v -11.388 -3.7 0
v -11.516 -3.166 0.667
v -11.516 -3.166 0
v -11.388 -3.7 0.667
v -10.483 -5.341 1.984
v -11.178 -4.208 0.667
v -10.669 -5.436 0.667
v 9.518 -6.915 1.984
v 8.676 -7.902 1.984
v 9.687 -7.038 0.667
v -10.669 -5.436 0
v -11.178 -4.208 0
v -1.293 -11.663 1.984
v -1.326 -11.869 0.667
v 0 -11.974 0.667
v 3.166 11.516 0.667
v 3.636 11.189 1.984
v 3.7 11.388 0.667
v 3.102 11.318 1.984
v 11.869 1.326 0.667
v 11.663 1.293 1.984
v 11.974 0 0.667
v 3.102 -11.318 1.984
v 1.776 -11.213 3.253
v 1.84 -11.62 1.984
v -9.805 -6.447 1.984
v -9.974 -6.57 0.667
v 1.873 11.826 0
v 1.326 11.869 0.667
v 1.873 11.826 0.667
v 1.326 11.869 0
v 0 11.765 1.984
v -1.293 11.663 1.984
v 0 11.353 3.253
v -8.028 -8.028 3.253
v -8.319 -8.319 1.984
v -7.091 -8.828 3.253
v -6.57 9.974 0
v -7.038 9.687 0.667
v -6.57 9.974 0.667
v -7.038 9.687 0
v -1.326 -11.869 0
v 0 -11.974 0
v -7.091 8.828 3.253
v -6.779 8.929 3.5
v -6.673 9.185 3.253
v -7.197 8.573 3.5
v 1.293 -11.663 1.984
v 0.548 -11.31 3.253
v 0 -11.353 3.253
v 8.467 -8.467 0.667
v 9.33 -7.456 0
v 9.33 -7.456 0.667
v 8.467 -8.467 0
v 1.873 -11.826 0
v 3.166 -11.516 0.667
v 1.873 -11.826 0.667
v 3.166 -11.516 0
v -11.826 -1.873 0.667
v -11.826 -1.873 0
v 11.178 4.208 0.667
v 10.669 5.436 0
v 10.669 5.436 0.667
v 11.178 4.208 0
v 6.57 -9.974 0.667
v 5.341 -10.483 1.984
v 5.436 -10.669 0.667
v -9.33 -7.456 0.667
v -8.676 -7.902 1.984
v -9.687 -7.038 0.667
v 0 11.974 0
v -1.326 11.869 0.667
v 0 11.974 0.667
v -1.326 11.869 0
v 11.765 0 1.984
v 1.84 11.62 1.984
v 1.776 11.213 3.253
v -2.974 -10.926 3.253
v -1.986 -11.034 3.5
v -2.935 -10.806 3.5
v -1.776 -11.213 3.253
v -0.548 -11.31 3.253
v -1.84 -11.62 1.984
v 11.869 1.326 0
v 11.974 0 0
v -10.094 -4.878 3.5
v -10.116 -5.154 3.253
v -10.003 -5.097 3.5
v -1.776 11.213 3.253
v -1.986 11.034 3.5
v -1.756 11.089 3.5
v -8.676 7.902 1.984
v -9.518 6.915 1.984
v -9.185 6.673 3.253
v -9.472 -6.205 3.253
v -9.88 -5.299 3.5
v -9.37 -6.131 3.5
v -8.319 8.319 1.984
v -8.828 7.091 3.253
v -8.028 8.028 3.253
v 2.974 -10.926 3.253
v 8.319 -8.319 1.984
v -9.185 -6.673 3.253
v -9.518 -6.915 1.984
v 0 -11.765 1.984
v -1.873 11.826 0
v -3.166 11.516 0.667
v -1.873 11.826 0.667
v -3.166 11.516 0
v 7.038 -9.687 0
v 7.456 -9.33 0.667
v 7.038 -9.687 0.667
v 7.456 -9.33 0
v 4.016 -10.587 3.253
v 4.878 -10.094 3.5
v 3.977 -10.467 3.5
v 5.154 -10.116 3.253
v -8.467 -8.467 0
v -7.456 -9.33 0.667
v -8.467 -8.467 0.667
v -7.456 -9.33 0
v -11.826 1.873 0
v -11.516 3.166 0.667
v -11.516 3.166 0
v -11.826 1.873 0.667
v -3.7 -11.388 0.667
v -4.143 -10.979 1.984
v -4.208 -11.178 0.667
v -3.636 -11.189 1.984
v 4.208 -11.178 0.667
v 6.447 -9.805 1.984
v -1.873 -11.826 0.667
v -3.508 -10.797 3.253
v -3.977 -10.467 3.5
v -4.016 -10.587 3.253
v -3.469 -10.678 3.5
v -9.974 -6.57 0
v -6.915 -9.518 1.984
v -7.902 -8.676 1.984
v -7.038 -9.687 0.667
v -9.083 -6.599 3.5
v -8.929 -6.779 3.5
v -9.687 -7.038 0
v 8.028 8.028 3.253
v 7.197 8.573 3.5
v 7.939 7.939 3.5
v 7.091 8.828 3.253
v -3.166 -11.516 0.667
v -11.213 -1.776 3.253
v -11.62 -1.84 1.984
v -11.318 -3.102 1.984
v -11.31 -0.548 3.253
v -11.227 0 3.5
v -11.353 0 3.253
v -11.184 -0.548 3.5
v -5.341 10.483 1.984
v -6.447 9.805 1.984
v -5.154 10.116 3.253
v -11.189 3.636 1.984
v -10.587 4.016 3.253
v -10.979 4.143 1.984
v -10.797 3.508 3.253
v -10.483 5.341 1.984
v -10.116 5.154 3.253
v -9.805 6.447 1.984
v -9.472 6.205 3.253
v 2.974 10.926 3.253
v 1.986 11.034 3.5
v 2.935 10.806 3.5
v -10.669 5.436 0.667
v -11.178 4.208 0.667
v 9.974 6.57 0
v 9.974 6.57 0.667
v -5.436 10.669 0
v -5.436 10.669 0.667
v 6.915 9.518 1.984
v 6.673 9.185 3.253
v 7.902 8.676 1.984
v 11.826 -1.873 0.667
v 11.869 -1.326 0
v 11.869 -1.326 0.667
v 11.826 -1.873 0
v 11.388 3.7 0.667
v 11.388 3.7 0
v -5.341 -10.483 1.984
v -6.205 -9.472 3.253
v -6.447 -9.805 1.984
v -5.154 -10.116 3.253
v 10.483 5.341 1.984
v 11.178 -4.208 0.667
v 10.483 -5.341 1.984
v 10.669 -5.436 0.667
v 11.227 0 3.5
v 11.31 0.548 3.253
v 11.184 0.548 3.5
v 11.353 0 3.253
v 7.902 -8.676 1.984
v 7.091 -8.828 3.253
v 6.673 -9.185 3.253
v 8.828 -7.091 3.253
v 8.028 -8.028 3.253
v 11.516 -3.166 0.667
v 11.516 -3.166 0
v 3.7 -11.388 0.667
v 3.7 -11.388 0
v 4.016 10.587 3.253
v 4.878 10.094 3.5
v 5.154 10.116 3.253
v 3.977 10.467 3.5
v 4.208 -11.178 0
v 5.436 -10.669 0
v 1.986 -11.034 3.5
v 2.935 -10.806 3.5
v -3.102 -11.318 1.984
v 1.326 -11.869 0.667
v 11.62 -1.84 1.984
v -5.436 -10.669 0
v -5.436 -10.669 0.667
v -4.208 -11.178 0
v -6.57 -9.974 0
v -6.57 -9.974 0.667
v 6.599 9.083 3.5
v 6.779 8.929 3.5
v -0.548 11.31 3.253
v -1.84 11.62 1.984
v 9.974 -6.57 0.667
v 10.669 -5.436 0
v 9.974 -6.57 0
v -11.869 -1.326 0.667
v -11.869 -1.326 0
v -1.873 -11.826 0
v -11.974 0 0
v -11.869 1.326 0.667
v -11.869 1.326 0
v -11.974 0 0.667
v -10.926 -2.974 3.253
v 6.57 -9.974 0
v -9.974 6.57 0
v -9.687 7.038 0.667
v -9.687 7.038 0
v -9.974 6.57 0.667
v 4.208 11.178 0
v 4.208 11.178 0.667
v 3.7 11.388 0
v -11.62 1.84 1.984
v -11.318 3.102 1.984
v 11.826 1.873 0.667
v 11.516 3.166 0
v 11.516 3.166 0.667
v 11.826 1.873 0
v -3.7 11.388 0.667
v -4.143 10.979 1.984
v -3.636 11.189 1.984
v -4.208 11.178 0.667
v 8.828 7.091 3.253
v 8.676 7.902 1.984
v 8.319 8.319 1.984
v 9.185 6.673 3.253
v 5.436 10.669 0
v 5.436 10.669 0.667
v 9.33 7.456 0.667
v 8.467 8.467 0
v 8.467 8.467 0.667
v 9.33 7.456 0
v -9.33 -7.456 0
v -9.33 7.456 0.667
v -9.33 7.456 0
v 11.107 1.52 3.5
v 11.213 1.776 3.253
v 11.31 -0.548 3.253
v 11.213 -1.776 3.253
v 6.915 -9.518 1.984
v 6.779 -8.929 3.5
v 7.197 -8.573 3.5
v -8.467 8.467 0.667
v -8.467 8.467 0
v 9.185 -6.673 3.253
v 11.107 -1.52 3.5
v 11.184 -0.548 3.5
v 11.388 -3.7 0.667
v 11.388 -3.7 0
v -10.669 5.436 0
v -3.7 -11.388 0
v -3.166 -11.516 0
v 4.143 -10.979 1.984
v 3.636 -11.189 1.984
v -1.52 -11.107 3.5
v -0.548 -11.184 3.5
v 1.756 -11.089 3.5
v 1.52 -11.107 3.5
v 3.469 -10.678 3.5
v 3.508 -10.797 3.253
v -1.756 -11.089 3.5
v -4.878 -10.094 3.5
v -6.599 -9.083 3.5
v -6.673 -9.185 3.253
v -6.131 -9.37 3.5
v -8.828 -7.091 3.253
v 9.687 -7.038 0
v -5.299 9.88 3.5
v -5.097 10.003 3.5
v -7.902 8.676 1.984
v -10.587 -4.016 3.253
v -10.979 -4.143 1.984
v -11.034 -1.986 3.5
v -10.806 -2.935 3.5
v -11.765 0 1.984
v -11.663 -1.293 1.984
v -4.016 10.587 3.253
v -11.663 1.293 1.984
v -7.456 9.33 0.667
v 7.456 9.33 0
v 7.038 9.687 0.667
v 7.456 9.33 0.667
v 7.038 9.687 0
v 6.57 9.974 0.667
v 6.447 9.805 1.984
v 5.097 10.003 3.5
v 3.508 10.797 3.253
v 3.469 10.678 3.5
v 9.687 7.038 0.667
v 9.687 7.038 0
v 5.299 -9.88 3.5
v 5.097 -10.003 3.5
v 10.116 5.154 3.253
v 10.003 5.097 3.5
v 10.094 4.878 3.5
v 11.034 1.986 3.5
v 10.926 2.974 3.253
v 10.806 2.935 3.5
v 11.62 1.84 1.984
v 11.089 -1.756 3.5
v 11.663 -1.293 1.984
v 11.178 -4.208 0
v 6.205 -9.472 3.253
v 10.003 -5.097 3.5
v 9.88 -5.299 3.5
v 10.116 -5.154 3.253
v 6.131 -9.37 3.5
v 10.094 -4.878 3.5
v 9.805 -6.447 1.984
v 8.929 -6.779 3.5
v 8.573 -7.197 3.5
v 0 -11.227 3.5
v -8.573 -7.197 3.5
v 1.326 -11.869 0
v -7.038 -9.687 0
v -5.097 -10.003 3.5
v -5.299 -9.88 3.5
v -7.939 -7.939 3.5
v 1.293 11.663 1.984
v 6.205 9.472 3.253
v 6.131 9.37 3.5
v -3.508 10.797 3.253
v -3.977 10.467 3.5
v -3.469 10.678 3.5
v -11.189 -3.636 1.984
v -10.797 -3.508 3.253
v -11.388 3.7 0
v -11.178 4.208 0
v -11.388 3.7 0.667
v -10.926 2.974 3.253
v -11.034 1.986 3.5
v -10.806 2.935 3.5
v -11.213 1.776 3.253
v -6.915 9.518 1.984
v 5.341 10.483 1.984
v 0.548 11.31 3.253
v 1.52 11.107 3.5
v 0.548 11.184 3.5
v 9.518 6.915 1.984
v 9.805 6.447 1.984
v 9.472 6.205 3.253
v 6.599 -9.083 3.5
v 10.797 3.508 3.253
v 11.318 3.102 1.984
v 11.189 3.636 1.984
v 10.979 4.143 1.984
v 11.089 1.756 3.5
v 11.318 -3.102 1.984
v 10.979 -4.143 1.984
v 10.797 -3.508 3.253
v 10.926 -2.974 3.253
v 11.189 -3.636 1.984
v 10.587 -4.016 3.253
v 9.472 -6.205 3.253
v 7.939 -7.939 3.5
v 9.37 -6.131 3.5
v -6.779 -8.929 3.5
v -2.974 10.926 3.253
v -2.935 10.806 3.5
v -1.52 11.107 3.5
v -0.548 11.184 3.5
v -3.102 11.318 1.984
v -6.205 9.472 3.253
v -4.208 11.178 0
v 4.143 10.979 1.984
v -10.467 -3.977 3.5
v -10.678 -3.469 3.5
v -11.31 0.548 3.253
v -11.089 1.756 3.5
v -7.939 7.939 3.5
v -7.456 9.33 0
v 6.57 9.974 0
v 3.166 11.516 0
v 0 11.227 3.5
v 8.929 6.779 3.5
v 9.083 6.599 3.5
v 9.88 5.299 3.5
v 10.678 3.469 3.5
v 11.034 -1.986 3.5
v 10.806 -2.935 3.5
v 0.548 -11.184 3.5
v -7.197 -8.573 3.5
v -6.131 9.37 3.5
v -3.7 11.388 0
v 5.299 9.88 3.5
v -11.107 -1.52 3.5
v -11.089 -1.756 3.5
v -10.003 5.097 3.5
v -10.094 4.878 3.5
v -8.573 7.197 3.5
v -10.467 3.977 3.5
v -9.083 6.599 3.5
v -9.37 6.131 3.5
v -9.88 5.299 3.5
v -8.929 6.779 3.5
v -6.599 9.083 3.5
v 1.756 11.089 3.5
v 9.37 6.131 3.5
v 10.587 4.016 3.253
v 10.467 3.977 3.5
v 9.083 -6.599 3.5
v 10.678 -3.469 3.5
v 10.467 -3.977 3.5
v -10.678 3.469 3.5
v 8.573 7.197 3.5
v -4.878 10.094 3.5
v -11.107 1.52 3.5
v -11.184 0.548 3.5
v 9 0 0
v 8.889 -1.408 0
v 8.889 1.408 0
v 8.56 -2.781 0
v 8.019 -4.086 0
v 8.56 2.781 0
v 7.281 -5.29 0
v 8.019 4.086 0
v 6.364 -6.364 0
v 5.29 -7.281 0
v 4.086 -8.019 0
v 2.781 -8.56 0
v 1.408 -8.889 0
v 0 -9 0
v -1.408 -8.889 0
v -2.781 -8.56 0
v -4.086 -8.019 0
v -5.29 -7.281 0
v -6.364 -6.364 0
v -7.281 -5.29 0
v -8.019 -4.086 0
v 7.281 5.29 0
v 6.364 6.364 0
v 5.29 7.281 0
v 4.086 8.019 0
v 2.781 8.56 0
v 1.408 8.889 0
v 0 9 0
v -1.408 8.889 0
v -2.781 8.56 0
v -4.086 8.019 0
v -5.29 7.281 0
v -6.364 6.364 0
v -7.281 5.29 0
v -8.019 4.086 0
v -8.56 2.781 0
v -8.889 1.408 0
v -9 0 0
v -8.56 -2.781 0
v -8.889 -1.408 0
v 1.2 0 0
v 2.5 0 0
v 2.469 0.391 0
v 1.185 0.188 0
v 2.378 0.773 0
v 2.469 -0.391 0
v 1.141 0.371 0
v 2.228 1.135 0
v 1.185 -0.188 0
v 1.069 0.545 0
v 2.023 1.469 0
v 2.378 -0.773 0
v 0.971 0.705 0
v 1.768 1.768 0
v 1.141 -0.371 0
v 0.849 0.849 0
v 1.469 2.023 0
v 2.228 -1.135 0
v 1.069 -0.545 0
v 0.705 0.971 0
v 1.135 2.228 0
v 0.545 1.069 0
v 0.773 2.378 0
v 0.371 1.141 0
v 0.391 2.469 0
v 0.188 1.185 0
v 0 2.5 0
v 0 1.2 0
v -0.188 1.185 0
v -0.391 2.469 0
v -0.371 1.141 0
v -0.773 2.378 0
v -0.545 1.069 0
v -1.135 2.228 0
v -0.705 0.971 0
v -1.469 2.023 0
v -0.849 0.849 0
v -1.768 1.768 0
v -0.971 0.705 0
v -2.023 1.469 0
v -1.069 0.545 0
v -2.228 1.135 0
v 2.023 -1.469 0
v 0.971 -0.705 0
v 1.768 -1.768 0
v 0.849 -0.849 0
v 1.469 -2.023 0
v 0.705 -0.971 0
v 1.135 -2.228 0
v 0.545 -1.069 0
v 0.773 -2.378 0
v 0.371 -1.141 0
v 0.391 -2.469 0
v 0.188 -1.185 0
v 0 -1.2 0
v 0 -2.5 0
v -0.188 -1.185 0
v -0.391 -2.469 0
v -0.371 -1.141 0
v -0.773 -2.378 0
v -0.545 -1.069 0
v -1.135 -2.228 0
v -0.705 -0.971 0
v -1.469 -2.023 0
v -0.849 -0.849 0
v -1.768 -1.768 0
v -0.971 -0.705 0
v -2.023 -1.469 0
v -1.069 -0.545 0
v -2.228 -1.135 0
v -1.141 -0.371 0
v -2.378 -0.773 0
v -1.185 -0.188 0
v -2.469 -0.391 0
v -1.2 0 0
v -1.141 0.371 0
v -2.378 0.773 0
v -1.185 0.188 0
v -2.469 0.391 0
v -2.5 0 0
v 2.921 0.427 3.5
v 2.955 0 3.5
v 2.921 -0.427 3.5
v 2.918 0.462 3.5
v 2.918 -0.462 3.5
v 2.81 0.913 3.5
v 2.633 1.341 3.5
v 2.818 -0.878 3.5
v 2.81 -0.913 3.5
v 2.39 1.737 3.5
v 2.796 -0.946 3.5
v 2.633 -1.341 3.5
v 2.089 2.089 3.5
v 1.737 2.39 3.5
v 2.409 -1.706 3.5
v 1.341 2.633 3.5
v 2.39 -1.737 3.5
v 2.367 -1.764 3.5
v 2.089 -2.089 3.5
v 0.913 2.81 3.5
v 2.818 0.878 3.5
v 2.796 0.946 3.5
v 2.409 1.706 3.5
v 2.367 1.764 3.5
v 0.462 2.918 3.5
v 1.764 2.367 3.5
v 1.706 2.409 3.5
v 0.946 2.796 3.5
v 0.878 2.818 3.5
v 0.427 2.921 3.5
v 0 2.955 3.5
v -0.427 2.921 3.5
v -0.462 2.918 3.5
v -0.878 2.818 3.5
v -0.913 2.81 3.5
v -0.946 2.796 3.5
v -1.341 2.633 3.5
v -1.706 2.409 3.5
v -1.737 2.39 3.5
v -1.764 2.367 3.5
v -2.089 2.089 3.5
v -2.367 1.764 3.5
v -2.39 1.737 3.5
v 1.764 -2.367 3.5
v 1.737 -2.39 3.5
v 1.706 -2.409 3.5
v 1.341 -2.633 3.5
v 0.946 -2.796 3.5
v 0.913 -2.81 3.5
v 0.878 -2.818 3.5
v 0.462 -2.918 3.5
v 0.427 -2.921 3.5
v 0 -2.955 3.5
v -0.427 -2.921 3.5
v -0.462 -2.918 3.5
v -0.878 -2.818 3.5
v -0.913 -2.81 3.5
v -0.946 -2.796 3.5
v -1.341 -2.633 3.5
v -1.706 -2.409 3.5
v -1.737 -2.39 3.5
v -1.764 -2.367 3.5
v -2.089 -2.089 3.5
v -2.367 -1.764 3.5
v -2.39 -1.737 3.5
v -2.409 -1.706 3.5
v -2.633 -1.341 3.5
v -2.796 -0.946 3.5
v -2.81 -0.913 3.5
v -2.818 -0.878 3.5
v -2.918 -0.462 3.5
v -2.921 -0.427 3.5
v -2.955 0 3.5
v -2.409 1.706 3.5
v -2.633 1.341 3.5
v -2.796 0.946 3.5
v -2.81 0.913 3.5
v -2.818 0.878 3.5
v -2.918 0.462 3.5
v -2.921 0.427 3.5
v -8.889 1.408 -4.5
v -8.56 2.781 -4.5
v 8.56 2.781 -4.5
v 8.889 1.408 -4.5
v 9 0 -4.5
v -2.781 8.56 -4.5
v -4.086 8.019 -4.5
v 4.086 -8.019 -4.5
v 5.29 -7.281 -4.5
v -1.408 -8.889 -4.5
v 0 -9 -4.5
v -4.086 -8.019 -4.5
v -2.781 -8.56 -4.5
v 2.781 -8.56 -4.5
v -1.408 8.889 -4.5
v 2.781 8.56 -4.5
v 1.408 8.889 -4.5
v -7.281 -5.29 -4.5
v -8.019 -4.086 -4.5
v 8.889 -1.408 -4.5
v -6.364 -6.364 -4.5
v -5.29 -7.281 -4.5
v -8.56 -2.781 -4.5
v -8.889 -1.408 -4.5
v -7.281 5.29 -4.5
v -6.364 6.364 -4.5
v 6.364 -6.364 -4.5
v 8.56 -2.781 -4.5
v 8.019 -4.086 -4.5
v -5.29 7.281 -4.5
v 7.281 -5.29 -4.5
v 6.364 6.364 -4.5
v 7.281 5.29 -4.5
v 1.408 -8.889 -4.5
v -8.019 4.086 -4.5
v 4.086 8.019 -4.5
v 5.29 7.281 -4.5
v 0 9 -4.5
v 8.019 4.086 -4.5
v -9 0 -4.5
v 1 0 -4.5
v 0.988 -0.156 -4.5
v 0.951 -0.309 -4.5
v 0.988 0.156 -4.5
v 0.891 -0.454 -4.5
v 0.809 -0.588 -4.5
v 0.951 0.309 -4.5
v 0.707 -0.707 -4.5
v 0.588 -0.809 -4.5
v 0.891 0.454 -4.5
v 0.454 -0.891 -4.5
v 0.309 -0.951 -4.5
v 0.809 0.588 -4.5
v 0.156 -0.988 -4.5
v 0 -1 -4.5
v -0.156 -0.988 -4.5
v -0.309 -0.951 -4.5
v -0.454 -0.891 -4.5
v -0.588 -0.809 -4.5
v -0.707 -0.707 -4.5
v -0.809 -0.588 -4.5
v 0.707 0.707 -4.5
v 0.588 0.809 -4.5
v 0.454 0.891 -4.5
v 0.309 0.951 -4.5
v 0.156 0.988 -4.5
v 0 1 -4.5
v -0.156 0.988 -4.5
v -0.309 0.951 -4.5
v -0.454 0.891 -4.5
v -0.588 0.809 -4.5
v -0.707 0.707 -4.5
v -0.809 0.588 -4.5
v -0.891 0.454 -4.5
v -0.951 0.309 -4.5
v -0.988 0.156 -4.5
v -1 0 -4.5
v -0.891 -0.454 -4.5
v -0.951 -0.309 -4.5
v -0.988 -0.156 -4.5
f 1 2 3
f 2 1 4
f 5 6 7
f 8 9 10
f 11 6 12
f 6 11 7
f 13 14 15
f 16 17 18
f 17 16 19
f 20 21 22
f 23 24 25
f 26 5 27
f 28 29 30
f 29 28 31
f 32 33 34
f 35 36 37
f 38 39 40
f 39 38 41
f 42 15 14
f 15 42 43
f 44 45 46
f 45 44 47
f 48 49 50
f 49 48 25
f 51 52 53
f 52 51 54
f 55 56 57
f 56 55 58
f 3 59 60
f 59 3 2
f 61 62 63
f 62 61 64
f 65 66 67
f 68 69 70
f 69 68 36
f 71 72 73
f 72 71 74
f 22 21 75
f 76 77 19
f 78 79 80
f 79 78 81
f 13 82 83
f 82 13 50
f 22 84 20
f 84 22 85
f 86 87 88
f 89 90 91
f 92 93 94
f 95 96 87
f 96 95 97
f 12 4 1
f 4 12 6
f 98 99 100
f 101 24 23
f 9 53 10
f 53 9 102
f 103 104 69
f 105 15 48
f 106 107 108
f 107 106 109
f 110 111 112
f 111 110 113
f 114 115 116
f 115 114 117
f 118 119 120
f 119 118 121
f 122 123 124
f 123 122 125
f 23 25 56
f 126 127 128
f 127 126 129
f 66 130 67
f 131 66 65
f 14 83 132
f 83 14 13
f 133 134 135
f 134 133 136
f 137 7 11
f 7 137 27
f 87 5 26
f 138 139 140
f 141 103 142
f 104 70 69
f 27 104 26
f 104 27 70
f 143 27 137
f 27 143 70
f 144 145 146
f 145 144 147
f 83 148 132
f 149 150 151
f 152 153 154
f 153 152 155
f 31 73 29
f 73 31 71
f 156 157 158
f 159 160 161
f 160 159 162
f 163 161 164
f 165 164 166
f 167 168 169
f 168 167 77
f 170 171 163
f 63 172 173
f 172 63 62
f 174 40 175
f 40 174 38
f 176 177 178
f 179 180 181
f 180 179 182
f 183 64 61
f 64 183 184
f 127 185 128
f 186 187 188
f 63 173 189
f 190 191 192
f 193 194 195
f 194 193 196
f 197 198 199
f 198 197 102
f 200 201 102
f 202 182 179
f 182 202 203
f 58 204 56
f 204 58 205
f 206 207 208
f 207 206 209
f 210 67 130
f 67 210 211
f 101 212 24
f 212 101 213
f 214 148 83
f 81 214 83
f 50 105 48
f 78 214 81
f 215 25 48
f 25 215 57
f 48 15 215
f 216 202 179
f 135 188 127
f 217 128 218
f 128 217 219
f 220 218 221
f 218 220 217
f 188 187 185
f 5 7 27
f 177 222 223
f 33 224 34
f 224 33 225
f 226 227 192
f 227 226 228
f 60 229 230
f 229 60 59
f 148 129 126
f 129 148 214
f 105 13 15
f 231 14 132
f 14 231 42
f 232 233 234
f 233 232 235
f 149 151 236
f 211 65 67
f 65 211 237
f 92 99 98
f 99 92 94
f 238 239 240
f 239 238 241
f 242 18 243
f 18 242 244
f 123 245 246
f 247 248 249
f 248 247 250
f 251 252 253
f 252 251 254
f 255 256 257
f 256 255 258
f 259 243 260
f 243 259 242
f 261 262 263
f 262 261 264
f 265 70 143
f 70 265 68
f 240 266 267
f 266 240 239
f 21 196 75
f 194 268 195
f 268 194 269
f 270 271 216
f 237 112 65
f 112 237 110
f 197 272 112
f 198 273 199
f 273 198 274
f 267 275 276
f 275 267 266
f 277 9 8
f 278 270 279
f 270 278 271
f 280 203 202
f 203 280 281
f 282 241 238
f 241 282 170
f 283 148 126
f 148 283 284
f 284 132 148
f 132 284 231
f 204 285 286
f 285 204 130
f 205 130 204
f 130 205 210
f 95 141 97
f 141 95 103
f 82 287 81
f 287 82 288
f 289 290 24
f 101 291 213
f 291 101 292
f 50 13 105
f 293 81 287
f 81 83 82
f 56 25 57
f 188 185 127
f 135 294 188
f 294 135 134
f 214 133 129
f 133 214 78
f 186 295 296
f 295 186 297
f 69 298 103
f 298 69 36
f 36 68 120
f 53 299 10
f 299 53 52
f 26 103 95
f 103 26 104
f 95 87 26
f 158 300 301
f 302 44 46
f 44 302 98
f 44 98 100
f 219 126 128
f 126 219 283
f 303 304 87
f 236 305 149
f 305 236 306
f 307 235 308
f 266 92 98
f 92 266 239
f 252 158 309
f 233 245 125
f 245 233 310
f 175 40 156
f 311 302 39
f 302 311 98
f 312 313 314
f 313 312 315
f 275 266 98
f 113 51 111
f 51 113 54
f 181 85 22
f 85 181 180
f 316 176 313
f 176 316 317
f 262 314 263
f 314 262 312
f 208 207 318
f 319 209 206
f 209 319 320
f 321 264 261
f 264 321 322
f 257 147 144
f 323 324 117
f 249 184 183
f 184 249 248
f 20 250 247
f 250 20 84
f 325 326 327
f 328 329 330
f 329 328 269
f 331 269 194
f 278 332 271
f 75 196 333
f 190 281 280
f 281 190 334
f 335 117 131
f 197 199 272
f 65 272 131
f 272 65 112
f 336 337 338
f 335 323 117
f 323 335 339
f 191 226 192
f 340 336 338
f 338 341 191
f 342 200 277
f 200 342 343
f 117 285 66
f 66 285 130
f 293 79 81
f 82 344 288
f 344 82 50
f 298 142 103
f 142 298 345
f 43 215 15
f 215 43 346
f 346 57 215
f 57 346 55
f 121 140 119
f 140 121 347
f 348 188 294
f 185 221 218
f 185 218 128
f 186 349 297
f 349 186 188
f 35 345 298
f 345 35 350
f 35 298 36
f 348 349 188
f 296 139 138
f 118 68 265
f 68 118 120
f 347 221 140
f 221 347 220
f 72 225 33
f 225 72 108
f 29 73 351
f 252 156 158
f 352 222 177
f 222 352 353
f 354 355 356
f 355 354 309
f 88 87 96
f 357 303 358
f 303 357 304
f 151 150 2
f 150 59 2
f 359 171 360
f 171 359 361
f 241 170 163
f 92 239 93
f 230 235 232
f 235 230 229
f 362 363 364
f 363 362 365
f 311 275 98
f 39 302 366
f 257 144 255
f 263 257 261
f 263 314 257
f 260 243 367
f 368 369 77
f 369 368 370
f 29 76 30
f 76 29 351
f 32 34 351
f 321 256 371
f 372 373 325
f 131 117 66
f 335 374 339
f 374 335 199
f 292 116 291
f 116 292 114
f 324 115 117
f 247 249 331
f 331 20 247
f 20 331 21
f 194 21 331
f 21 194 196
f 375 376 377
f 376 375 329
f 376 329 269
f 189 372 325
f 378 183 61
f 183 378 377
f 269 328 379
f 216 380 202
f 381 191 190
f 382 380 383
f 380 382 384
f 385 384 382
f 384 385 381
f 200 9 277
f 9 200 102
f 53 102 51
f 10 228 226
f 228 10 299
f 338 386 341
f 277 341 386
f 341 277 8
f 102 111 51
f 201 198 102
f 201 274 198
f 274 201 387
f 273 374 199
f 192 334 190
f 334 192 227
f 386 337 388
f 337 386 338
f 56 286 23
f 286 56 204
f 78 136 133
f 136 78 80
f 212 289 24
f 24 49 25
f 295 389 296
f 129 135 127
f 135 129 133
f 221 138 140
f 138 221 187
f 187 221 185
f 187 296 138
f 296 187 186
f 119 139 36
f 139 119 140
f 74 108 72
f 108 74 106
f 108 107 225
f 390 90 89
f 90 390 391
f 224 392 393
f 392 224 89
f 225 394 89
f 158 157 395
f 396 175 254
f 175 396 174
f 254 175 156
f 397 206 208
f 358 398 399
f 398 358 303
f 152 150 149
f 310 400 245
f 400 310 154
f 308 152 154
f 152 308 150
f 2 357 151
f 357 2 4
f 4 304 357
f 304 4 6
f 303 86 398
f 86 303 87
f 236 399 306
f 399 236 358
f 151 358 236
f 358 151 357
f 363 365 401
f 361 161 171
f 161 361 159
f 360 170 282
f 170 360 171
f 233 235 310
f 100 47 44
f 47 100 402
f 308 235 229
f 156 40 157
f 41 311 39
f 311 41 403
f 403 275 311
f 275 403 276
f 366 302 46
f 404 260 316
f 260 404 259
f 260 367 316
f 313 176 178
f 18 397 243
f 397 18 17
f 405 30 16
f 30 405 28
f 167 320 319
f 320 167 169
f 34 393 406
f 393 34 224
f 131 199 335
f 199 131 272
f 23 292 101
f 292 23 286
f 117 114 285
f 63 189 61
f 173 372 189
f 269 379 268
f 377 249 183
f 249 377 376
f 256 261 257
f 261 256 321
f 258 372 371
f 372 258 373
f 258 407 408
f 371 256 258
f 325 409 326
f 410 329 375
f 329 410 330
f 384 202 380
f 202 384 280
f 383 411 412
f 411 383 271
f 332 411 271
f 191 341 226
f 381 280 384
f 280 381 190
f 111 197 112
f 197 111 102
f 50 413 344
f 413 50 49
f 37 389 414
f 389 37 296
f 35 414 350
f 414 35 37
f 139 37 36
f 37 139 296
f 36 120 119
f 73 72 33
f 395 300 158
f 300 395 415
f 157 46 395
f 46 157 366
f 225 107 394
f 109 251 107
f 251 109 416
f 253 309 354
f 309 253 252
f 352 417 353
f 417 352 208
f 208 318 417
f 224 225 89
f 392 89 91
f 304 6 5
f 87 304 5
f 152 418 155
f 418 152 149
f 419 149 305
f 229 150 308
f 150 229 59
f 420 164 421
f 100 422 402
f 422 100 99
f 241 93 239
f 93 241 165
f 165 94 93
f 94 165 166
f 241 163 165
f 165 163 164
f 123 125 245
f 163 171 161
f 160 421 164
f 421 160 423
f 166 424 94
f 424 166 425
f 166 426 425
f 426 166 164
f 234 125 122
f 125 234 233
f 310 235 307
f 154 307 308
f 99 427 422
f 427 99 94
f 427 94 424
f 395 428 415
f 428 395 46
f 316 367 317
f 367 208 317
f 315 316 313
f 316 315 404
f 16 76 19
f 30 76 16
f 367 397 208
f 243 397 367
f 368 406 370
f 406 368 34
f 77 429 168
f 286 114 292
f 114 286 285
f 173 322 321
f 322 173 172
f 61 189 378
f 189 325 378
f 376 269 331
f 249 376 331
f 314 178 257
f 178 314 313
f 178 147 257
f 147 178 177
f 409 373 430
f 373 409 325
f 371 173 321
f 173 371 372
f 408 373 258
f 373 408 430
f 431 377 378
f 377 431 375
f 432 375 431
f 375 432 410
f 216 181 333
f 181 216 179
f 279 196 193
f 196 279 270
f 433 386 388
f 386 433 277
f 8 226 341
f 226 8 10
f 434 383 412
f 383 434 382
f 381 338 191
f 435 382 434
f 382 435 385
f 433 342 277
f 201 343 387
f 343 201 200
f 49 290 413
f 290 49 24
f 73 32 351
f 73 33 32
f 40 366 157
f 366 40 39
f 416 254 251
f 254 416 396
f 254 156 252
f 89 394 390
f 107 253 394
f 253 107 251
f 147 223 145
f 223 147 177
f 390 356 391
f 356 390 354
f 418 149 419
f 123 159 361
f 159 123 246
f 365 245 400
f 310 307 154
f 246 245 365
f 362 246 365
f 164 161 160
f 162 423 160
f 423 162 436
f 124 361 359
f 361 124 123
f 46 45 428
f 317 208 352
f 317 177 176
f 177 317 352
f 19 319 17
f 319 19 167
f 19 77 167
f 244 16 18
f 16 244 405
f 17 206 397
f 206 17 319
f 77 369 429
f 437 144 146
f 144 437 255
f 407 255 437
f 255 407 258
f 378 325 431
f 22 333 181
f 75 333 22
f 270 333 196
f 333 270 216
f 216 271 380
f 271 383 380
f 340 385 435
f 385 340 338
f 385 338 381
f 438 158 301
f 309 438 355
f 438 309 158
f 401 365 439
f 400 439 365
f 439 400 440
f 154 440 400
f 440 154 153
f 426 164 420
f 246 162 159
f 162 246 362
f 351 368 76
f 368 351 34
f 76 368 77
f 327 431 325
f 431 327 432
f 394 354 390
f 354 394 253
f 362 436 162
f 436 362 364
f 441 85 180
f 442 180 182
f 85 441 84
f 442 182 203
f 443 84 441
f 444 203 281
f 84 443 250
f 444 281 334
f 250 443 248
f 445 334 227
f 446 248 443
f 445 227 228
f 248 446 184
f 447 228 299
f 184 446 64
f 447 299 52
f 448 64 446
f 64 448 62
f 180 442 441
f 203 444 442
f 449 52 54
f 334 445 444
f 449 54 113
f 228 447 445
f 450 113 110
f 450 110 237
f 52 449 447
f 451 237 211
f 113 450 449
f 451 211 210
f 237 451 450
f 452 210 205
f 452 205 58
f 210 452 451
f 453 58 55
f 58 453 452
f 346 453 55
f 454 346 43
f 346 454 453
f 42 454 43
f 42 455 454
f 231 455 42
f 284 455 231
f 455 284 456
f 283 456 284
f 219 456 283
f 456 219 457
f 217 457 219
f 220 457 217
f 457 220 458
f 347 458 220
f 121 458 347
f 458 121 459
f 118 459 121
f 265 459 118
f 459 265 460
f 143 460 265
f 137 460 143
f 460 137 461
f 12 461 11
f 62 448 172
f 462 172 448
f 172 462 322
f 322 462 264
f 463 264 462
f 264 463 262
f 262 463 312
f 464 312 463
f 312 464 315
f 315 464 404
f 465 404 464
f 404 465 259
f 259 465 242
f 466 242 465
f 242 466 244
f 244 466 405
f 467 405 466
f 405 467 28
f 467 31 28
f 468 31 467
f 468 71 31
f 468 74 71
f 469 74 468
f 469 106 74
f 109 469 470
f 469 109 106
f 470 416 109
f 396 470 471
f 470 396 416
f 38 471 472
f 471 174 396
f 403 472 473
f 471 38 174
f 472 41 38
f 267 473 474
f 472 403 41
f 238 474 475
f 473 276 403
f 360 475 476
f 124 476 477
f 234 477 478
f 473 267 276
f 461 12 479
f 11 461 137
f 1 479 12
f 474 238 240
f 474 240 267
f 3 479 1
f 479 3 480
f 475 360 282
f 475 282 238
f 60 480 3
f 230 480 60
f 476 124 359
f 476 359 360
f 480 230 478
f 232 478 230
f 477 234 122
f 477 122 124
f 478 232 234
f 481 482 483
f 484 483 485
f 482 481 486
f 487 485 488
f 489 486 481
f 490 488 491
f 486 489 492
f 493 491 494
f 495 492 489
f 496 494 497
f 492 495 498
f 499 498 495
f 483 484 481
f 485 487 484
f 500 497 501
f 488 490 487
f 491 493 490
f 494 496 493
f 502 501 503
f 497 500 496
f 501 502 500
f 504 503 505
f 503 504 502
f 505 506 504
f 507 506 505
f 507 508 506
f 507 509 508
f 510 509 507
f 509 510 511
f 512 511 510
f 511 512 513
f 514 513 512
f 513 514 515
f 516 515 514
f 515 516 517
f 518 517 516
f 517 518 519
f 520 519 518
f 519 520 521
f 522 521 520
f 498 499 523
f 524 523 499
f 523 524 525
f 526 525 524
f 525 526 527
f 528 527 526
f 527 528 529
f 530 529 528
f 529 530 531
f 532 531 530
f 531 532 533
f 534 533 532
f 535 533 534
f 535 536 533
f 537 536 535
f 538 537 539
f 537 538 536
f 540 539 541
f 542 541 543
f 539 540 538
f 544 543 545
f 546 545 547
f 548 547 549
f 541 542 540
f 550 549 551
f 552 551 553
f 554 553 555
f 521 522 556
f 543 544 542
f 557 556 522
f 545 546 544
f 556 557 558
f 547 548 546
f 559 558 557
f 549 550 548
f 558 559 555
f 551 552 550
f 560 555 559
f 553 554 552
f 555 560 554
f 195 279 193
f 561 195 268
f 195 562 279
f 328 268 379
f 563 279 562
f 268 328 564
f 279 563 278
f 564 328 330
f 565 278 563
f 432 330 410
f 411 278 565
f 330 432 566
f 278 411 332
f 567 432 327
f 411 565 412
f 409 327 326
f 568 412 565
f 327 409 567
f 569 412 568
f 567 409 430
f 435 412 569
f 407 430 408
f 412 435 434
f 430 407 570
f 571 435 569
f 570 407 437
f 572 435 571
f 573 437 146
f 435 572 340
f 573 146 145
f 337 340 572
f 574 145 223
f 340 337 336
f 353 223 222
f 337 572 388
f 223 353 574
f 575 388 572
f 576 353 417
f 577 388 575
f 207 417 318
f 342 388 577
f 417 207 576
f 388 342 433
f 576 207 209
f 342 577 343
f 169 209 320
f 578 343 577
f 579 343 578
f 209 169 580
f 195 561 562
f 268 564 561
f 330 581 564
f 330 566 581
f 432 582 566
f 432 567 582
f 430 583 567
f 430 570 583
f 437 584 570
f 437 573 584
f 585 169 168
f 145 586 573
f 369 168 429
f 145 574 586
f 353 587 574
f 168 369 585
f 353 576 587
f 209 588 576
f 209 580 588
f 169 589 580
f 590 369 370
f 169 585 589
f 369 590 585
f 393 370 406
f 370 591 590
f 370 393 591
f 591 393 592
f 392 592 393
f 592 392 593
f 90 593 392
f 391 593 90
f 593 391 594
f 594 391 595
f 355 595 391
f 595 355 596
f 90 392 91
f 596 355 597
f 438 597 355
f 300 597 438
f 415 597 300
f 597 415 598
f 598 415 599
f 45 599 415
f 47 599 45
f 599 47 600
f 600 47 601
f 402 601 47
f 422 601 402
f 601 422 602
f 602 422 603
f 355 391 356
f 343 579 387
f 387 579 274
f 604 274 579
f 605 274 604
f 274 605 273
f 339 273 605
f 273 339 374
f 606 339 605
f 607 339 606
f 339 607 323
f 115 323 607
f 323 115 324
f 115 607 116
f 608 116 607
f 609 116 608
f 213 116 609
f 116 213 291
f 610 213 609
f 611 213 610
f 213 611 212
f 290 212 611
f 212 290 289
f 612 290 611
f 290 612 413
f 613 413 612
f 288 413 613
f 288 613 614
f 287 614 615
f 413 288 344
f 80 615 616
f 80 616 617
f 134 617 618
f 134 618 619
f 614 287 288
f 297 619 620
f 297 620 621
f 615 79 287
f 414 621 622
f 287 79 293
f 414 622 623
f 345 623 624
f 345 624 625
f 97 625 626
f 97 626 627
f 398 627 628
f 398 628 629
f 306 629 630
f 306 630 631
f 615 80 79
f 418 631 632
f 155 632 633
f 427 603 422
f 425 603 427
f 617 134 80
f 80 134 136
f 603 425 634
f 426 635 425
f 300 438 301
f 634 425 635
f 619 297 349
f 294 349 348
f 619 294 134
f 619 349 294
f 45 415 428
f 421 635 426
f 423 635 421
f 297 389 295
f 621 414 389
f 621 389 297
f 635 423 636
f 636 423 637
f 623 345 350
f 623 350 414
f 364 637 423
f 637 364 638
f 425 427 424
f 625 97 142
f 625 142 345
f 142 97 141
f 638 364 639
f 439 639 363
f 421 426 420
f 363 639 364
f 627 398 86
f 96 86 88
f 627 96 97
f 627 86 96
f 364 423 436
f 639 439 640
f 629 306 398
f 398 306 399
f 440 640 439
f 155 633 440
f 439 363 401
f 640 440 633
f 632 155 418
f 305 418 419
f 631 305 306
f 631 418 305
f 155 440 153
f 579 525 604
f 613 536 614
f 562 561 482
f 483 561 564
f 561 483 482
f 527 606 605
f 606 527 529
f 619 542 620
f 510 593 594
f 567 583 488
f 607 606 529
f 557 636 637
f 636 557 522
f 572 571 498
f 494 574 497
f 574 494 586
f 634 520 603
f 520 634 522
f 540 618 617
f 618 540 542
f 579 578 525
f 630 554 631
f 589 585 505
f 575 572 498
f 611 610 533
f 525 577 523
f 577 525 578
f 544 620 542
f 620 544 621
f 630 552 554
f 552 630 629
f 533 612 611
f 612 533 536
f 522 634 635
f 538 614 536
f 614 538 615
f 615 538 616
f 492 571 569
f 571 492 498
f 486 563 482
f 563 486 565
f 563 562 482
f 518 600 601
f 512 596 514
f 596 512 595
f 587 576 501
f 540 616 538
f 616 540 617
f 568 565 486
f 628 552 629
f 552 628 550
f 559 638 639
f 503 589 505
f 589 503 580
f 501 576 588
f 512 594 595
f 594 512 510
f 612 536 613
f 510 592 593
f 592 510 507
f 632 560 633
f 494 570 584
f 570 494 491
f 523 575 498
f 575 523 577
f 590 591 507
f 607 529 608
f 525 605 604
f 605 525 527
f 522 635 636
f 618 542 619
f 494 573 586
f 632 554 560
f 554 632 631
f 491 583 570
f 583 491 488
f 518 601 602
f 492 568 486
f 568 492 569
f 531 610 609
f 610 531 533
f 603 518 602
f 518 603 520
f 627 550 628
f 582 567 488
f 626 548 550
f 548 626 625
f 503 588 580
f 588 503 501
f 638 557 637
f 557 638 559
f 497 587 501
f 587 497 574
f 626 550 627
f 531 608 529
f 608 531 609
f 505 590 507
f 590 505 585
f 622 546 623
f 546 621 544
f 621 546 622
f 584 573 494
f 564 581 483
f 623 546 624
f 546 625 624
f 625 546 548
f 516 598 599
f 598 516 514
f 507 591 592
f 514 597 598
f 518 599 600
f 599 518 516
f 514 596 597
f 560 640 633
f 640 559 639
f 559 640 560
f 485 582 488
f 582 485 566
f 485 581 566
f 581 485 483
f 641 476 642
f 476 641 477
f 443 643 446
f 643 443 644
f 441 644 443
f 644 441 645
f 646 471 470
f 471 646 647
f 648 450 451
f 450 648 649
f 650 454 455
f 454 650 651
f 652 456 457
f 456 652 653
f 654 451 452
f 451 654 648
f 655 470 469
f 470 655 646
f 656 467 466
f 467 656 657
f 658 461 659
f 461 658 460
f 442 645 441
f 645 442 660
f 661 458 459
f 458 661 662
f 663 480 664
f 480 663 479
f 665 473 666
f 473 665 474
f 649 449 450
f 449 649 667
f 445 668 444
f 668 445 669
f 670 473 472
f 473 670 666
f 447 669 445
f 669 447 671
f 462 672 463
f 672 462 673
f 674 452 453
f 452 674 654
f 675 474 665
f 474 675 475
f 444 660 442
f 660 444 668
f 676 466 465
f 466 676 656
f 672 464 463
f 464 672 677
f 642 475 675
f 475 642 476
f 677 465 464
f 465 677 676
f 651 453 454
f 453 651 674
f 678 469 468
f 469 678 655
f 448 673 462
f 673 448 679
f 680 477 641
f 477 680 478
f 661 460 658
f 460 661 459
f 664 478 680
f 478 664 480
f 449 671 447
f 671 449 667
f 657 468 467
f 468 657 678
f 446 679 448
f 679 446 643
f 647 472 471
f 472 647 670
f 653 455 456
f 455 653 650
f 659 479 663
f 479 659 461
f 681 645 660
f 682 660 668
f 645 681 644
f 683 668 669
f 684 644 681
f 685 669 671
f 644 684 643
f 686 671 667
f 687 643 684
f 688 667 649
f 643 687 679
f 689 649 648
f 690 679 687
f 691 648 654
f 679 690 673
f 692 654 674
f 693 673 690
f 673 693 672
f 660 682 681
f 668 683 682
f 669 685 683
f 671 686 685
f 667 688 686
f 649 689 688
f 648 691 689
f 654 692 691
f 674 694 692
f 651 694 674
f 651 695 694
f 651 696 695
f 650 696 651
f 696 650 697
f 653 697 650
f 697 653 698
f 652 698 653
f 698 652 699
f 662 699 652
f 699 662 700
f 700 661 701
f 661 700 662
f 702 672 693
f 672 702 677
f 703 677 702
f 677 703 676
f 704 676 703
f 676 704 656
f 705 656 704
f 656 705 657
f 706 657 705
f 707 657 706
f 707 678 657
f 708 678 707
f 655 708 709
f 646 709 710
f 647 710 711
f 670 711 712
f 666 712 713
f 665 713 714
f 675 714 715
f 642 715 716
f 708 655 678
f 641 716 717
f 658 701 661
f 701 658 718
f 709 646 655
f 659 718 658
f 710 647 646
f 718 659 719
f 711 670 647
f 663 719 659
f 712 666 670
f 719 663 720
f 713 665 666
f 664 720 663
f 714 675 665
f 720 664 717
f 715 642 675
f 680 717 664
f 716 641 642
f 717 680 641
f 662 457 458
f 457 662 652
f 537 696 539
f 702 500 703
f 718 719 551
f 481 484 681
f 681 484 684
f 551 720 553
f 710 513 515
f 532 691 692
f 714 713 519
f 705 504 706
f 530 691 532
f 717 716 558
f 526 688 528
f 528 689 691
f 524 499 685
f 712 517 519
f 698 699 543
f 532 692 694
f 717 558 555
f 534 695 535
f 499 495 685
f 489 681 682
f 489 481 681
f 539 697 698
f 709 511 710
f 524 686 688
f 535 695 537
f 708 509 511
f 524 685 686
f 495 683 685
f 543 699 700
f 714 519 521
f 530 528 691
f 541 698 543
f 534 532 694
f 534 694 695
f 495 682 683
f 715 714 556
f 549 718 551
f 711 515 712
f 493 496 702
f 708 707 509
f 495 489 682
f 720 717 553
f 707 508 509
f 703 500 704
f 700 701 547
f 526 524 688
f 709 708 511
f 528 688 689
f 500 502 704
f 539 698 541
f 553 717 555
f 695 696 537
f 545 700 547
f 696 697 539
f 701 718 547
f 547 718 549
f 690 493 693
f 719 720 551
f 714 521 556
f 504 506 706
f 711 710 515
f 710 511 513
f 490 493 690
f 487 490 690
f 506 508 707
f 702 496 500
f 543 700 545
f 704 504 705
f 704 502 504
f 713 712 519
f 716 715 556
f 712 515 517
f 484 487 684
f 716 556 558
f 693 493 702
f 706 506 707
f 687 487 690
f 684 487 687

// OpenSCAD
//Variables
fragmentCount = 40;

footDiameter = 24;
footHeight = 3.5;
footRadius = 8.5;

baseDiameter = 18;
baseHeight = 4.5;

nailHeadDiameter = 5;
nailDiameter = 2;

//Create solid
$fn=fragmentCount;
union()
{
    //Create foot
    difference()
    {
        roundedcylinder(footHeight,footDiameter/2,footRadius,0);
        cylinder(footHeight*1.1, nailHeadDiameter/2, nailHeadDiameter/2*1.2, false);
    }

    //Create base
    difference()
    {
        translate([0,0,-baseHeight])cylinder(baseHeight, baseDiameter/2, baseDiameter/2);
        translate([0,0,-baseHeight])cylinder(baseHeight, nailDiameter/2, nailDiameter/2*1.2, false);
    }
}

module roundedcylinder(zDim, rDim, rTop, rBottom)
{    
    union()
    {
        //Top rounded edge
        intersection()
        {
            if (rTop>zDim)            
            {
                translate([0,0,zDim-rTop/(rTop/zDim)])translate([0,0,-rTop])difference()
                {
                    minkowski()
                    {
                        cylinder(rTop,rDim-rTop,rDim-rTop,false);
                        difference()
                         {
                             sphere(rTop);
                             translate([-rTop,-rTop,-rTop])cube([rTop*2,rTop*2,rTop]);
                         }     
                     }
                     translate([-rDim,-rDim,0])cube([rDim*2,rDim*2,rTop]);
                 }         
             }
             else
             {
                 translate([0,0,zDim-rTop])translate([0,0,-rTop])difference()
                 {
                    minkowski()
                    {
                        cylinder(rTop,rDim-rTop,rDim-rTop,false);
                        difference()
                         {
                             sphere(rTop);
                             translate([-rTop,-rTop,-rTop])cube([rTop*2,rTop*2,rTop]);
                         }     
                     }
                     translate([-rDim,-rDim,0])cube([rDim*2,rDim*2,rTop]);
                 }
             }
             cylinder(zDim,rDim,rDim,false);       
         }   
         
        //Bottom rounded edge
         intersection()
         {
            if(rBottom>zDim)
            {
                translate([0,0,0+rBottom/(rBottom/zDim)])translate([0,0,-rBottom])difference()
                {
                    minkowski()
                    {
                        cylinder(rBottom,rDim-rTop,rDim-rTop,false);
                        translate([0,0,rBottom])difference()
                         {
                             sphere(rBottom);
                             translate([-rBottom,-rBottom,0])cube([rBottom*2,rBottom*2,rBottom]);
                         }     
                     }
                     translate([-rDim,-rDim,rBottom])cube([rDim*2,rDim*2,rBottom]);
                }    
            }
            else
            {
                translate([0,0,rBottom])translate([0,0,-rBottom])difference()
                {
                    minkowski()
                    {
                        cylinder(rBottom,rDim-rTop,rDim-rTop,false);
                        translate([0,0,rBottom])difference()
                         {
                             sphere(rBottom);
                             translate([-rBottom,-rBottom,0])cube([rBottom*2,rBottom*2,rBottom]);
                         }     
                     }
                     translate([-rDim,-rDim,rBottom])cube([rDim*2,rDim*2,rBottom]);
                }
            }
            cylinder(zDim,rDim,rDim,false);                   
        }
    }
}
